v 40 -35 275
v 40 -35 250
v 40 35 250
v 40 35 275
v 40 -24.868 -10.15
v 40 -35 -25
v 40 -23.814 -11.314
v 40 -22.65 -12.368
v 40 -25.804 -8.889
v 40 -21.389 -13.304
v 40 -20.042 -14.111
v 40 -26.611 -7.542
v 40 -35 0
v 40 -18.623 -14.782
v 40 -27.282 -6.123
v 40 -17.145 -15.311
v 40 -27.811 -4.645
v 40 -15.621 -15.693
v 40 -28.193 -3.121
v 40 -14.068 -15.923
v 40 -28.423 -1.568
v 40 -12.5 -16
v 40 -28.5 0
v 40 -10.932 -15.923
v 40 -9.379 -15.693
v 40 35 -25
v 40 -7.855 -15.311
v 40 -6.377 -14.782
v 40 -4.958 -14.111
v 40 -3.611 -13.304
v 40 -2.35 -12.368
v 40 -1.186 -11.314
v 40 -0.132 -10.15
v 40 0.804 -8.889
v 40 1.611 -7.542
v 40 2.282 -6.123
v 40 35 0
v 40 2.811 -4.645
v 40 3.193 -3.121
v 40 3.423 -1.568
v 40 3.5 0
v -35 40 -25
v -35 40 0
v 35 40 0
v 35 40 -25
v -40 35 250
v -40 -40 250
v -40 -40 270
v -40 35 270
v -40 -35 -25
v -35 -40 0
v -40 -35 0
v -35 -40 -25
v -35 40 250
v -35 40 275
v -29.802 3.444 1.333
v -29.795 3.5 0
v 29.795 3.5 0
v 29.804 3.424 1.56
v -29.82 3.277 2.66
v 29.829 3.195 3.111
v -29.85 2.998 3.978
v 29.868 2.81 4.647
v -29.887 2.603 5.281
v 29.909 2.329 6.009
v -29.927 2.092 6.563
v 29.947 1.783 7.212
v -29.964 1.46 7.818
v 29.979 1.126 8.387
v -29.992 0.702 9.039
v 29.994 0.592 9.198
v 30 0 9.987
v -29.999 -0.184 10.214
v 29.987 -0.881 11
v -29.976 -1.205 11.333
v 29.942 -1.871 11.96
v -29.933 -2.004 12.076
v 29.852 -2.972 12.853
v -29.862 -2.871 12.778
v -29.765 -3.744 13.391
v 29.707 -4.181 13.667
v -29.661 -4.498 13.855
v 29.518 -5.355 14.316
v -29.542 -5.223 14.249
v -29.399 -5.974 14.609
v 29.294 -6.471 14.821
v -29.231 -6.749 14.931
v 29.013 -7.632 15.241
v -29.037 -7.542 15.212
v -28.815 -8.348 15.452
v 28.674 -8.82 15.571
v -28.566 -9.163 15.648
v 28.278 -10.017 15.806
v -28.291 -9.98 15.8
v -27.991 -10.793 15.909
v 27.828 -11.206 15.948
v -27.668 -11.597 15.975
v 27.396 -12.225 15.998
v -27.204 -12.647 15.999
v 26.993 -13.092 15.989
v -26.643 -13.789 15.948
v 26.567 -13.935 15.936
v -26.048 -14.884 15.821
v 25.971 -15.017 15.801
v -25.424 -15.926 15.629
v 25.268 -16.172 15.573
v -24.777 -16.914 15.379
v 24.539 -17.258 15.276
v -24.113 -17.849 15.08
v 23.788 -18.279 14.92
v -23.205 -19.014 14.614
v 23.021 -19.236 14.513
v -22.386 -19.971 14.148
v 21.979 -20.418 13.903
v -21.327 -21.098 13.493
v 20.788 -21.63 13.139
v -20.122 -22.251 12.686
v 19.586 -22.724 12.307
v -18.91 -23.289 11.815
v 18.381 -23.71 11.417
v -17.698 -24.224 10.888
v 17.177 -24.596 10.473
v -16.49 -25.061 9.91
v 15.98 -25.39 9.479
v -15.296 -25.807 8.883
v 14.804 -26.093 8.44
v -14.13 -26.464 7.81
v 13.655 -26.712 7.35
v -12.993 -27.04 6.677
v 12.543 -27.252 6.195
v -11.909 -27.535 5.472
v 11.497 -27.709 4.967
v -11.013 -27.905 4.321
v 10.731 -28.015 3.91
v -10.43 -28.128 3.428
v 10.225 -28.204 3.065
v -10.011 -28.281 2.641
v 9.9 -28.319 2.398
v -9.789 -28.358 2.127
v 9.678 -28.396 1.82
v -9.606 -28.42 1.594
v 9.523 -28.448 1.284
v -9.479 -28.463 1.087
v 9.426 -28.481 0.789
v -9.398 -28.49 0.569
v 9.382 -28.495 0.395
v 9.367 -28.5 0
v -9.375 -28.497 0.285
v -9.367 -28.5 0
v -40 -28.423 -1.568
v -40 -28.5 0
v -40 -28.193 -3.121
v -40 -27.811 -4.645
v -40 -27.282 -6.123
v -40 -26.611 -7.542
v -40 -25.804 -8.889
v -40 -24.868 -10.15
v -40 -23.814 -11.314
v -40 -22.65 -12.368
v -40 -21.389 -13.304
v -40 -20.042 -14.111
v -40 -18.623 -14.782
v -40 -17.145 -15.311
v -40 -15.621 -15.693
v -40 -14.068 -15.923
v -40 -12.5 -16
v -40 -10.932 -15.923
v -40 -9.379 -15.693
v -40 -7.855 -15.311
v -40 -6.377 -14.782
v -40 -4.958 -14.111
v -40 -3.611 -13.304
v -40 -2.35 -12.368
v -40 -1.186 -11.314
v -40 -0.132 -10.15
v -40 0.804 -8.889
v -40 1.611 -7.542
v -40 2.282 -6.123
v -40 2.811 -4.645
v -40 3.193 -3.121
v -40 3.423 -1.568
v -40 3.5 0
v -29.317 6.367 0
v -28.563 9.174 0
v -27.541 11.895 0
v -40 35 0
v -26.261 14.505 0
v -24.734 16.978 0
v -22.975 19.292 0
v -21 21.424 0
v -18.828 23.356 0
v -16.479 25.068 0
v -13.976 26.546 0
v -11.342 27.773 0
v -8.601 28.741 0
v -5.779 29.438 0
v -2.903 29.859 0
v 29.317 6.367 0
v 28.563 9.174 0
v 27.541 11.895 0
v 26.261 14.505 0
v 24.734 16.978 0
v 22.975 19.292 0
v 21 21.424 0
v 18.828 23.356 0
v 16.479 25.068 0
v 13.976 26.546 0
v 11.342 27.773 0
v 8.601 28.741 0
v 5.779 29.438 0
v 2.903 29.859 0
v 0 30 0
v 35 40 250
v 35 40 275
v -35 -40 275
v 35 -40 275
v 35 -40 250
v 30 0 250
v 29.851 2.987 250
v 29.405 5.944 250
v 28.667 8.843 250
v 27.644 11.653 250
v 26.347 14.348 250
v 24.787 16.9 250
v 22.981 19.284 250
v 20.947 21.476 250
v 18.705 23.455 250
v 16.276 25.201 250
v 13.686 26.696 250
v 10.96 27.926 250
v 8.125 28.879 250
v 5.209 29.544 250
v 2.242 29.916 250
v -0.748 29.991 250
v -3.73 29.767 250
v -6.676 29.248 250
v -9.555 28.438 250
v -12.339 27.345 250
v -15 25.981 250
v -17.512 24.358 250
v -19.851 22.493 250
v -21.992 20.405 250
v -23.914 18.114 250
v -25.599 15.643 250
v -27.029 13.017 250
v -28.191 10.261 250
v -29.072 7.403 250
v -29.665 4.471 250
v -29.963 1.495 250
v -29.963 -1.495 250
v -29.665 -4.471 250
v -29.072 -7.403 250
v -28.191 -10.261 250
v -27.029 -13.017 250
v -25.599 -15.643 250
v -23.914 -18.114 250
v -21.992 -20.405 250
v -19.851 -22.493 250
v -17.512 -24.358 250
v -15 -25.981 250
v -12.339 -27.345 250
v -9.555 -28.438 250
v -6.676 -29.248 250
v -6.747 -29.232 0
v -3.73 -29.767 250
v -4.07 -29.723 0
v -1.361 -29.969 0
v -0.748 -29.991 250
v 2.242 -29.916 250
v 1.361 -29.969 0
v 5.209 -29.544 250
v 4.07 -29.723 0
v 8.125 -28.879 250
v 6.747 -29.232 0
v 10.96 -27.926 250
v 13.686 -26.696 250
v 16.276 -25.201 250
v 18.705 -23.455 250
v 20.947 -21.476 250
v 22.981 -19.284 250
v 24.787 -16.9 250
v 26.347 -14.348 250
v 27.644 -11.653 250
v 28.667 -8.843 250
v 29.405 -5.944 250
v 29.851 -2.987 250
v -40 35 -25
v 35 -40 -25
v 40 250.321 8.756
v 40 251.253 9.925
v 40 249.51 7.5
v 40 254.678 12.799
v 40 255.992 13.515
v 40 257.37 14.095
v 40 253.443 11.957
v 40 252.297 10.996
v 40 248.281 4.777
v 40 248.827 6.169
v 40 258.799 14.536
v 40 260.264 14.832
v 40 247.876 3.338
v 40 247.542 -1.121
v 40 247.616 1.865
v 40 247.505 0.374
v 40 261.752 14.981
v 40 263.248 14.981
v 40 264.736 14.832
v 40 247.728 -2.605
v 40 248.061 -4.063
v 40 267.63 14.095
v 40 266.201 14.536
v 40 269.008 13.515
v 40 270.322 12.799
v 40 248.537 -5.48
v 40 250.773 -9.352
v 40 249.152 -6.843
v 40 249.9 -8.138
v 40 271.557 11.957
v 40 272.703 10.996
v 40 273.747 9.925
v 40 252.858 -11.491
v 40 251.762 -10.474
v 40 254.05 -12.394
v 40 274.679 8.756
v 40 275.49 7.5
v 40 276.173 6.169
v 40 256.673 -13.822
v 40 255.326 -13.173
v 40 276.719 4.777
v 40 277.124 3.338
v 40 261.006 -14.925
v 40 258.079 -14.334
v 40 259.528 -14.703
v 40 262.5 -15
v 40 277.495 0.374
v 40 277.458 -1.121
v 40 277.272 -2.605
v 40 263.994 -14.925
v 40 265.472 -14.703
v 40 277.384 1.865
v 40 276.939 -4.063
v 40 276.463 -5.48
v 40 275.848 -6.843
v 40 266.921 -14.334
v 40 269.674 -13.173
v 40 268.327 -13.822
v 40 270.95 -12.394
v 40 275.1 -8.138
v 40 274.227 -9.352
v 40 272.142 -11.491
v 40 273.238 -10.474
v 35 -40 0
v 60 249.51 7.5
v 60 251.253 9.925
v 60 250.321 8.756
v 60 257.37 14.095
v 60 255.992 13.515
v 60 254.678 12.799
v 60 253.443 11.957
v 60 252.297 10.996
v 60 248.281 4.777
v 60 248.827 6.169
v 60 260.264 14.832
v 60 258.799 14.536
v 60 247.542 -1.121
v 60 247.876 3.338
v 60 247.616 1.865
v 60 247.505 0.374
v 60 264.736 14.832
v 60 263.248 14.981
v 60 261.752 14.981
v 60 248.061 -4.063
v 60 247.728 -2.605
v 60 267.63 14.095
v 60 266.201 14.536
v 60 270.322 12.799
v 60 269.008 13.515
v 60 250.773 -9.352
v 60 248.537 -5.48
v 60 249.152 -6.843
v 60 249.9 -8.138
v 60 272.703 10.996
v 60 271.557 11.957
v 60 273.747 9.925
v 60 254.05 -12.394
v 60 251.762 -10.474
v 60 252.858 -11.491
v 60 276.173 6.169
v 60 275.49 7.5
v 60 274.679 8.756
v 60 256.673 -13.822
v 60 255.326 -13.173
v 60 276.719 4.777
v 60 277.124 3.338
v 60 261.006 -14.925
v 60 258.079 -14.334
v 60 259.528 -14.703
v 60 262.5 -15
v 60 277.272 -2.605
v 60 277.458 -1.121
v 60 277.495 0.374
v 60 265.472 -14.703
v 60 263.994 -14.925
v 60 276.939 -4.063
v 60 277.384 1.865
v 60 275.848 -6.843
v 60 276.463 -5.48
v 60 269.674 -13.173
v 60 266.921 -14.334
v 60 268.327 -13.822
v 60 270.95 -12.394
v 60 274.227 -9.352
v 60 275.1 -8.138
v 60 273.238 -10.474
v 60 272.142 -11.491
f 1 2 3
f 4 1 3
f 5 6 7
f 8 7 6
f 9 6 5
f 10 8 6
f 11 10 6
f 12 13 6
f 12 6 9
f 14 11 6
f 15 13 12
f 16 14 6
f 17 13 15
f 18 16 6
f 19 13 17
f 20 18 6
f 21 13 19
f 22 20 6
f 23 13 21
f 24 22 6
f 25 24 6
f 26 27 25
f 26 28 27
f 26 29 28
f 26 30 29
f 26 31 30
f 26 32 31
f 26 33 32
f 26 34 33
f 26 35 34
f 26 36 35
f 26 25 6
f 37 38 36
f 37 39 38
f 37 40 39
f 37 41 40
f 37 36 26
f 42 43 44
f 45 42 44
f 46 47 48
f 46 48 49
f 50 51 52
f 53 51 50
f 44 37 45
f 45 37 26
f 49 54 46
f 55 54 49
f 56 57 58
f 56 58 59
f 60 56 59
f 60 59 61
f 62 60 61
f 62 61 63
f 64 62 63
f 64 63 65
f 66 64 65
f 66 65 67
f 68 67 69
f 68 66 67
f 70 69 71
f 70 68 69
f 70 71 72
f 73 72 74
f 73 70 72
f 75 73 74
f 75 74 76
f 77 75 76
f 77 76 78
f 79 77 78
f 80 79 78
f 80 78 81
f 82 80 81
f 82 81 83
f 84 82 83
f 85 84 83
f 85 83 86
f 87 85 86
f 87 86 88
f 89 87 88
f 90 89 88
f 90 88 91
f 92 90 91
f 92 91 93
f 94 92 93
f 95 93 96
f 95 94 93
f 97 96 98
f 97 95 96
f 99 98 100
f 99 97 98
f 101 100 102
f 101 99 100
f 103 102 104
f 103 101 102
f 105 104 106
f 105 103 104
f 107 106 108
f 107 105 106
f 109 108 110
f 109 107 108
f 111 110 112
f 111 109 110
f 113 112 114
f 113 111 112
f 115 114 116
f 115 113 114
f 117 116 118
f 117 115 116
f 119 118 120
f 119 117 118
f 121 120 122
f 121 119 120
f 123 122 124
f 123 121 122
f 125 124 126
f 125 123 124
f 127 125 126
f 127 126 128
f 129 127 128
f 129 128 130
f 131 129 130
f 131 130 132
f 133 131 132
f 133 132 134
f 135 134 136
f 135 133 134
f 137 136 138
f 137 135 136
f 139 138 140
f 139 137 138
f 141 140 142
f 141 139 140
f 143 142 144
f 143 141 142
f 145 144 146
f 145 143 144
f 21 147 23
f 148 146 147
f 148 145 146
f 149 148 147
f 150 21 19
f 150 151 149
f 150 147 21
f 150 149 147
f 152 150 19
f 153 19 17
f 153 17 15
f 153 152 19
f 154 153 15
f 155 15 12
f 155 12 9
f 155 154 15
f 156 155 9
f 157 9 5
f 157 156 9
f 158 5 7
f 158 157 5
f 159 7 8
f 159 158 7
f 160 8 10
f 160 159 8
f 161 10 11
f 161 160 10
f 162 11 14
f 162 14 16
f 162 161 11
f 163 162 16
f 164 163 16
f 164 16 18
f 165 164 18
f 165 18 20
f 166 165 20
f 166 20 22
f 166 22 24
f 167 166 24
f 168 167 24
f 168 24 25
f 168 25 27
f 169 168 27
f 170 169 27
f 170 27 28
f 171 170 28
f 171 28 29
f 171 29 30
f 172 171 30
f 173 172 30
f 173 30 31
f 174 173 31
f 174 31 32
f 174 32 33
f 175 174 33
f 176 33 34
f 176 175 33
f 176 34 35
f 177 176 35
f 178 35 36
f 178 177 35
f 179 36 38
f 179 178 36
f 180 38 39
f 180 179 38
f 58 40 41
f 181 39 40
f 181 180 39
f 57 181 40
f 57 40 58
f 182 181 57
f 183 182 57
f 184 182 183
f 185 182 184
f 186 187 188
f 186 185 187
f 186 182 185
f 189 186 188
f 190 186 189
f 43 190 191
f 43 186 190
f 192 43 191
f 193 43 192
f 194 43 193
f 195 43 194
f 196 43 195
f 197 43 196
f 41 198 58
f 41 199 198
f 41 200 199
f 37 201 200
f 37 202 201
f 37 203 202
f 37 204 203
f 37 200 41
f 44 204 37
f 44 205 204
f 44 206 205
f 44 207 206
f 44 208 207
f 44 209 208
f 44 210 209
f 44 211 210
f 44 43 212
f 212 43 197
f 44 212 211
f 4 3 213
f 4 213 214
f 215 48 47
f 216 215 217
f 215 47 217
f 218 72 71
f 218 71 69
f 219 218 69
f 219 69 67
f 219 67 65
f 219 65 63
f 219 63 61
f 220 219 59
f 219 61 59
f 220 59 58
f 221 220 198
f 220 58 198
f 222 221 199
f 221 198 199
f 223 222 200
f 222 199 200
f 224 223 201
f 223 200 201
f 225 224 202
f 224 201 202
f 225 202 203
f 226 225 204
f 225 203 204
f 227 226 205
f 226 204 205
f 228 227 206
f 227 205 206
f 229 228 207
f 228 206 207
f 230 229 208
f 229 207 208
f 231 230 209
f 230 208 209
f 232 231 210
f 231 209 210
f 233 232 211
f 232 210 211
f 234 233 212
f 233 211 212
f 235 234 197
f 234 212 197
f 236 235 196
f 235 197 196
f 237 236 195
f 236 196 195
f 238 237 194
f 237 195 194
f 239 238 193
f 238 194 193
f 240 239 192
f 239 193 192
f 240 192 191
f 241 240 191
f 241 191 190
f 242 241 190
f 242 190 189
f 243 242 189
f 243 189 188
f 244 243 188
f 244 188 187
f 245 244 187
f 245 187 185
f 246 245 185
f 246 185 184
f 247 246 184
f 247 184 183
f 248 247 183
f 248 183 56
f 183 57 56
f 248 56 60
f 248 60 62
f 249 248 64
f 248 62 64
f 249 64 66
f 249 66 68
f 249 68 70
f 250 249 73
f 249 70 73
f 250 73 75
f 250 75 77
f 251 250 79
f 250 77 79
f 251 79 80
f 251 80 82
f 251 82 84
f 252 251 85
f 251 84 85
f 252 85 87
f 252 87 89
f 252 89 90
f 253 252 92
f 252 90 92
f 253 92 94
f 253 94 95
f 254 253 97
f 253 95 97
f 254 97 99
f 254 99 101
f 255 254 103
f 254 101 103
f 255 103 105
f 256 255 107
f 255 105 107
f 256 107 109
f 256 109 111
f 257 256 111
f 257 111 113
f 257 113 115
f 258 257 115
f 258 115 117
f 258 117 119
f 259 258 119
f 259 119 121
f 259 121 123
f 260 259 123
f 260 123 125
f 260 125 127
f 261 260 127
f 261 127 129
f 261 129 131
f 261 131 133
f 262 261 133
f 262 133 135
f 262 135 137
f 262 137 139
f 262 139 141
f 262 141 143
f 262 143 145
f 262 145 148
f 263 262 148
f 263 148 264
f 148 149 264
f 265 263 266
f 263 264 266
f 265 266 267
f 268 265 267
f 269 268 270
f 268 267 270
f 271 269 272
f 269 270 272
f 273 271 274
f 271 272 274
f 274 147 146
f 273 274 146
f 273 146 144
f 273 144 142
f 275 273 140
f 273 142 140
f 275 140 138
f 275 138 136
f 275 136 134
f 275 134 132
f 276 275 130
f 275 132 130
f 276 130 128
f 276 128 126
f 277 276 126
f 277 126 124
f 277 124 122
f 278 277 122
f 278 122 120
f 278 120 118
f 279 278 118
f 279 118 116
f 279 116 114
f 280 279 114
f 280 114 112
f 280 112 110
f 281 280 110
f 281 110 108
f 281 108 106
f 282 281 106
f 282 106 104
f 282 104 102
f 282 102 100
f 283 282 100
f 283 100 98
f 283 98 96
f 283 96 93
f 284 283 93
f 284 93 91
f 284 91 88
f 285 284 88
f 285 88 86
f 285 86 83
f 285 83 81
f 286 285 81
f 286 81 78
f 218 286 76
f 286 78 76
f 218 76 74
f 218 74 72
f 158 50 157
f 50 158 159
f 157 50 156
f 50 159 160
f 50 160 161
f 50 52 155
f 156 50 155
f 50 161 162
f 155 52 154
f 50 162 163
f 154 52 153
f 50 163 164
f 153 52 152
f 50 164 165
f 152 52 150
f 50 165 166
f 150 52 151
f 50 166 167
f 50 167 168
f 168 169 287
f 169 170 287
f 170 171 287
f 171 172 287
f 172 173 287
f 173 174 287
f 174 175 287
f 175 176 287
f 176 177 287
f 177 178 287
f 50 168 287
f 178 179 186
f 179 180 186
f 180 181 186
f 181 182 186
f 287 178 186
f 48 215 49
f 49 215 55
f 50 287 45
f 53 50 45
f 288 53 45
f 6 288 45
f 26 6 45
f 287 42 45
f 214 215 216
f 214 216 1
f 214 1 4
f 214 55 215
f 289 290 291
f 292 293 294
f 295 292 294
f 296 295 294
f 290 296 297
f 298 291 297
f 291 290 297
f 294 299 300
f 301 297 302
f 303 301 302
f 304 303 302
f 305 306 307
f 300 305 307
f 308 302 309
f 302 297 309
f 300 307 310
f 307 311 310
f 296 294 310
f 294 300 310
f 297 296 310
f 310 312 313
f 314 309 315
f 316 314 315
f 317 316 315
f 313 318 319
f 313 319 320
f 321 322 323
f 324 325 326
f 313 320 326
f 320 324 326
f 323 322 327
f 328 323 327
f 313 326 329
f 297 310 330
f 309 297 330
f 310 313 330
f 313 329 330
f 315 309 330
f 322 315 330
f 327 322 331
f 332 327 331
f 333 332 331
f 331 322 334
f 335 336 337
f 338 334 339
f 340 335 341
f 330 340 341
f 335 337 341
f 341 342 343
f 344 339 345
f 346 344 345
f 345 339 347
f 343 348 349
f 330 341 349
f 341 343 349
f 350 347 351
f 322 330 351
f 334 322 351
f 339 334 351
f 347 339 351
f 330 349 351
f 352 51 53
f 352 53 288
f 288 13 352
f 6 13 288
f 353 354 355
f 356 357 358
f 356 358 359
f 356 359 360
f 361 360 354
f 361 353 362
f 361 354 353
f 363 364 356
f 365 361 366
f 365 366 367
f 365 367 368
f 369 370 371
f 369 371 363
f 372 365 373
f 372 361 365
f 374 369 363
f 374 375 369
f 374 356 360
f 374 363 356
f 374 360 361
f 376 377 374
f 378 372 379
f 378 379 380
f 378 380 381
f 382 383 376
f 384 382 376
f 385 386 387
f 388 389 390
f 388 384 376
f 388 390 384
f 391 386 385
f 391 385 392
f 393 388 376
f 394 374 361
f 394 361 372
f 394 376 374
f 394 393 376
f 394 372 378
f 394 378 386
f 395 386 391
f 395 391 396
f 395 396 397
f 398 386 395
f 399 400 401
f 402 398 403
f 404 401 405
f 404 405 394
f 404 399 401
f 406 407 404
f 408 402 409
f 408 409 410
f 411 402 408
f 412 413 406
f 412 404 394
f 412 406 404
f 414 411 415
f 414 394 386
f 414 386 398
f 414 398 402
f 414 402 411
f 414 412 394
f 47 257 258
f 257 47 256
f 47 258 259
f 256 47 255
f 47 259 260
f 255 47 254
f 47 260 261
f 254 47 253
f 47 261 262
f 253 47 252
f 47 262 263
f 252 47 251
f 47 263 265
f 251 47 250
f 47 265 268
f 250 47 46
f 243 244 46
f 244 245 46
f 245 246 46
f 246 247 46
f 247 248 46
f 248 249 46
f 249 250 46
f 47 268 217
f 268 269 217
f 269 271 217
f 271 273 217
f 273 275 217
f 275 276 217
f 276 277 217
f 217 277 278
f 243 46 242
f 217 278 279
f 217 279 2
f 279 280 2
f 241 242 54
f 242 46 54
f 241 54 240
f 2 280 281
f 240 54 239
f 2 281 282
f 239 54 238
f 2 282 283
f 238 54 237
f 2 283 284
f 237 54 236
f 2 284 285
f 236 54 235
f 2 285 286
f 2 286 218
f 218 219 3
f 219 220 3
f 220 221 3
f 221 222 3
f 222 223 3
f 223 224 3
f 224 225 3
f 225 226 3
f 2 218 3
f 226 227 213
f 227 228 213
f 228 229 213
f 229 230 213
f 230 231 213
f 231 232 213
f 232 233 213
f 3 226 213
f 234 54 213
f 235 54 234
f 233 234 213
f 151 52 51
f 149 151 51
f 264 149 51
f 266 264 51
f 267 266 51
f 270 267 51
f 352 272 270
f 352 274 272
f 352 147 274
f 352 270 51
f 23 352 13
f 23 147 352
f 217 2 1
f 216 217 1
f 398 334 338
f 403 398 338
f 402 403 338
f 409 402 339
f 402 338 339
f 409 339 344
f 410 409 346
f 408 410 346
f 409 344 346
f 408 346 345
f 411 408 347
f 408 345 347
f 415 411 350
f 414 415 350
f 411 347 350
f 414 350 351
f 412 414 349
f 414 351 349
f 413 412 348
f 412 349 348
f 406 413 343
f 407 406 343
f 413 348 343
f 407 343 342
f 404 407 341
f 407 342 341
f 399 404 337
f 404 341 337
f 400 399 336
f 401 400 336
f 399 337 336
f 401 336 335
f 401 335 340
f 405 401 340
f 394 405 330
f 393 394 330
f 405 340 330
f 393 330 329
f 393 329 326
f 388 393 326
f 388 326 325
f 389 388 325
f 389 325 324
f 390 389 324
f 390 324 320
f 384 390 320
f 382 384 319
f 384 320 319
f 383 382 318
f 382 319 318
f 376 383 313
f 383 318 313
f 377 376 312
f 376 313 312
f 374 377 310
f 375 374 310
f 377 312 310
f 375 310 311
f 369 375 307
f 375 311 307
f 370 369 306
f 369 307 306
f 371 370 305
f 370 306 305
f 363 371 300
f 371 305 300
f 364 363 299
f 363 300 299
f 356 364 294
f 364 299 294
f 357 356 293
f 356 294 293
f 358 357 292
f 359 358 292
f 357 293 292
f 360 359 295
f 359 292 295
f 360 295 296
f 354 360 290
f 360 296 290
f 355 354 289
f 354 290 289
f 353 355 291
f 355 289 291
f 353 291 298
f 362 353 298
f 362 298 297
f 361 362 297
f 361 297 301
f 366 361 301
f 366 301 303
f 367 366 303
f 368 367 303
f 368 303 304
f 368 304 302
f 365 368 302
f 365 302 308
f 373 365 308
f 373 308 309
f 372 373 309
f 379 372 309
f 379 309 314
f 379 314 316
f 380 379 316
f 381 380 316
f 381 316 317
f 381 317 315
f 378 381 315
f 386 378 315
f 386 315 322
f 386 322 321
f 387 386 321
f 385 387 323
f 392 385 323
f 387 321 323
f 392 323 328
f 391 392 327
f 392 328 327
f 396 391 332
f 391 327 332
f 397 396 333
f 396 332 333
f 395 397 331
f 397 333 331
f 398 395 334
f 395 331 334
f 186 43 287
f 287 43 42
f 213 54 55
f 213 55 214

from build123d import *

# Parameters (mm, degrees)
SKETCH1_R           = 30
BOSS_EXTRUDE1_DEPTH = 250
SKETCH2_W           = 80
SKETCH2_H           = 80
BOSS_EXTRUDE2_DEPTH = 25
SKETCH3_R           = 16
CUT_EXTRUDE1_DEPTH  = 80
CHAMFER1_SIZE       = 5
SKETCH5_W           = 80
SKETCH5_H           = 80
BOSS_EXTRUDE3_DEPTH = 25
SKETCH6_R           = 15
BOSS_EXTRUDE4_DEPTH = 20
CHAMFER4_SIZE       = 5


with BuildPart() as part:
    # Sketch1 → Boss-Extrude1 (new body)
    with BuildSketch(Plane.XY):
        Circle(SKETCH1_R)
    extrude(amount=BOSS_EXTRUDE1_DEPTH)

    # Sketch2 → Boss-Extrude2 (add)
    with BuildSketch(Plane.XY):
        Rectangle(SKETCH2_W, SKETCH2_H)
    extrude(amount=-BOSS_EXTRUDE2_DEPTH)

    # Sketch3 → Cut-Extrude1 (cut)
    with BuildSketch(Plane(origin=(-40, 0, 0), x_dir=(0, 0, -1), z_dir=(1, 0, 0))):
        with Locations((0, -12.5)):
            Circle(SKETCH3_R)
    extrude(amount=CUT_EXTRUDE1_DEPTH, mode=Mode.SUBTRACT)

    # Chamfer1
    chamfer1_edges = [part.edges().sort_by_distance(p)[0] for p in [
        (40, 40, -12.5),
        (40, -40, -12.5),
        (-40, 40, -12.5),
        (-40, -40, -12.5),
    ]]
    chamfer(chamfer1_edges, length=CHAMFER1_SIZE)

    # Sketch5 → Boss-Extrude3 (add)
    with BuildSketch(Plane.XY.offset(250)):
        Rectangle(SKETCH5_W, SKETCH5_H)
    extrude(amount=BOSS_EXTRUDE3_DEPTH)

    # Chamfer4
    chamfer4_edges = [part.edges().sort_by_distance(p)[0] for p in [
        (40, 40, 262.5),
        (40, -40, 262.5),
        (-40, 40, 262.5),
        (-40, 0, 275),
    ]]
    chamfer(chamfer4_edges, length=CHAMFER4_SIZE)


with BuildPart() as body_2:
    # Sketch6 → Boss-Extrude4 (new body)
    with BuildSketch(Plane(origin=(40, 0, 0), x_dir=(0, 0, -1), z_dir=(1, 0, 0))):
        with Locations((0, 262.5)):
            Circle(SKETCH6_R)
    extrude(amount=BOSS_EXTRUDE4_DEPTH)


solid = Compound([part.part, body_2.part])
